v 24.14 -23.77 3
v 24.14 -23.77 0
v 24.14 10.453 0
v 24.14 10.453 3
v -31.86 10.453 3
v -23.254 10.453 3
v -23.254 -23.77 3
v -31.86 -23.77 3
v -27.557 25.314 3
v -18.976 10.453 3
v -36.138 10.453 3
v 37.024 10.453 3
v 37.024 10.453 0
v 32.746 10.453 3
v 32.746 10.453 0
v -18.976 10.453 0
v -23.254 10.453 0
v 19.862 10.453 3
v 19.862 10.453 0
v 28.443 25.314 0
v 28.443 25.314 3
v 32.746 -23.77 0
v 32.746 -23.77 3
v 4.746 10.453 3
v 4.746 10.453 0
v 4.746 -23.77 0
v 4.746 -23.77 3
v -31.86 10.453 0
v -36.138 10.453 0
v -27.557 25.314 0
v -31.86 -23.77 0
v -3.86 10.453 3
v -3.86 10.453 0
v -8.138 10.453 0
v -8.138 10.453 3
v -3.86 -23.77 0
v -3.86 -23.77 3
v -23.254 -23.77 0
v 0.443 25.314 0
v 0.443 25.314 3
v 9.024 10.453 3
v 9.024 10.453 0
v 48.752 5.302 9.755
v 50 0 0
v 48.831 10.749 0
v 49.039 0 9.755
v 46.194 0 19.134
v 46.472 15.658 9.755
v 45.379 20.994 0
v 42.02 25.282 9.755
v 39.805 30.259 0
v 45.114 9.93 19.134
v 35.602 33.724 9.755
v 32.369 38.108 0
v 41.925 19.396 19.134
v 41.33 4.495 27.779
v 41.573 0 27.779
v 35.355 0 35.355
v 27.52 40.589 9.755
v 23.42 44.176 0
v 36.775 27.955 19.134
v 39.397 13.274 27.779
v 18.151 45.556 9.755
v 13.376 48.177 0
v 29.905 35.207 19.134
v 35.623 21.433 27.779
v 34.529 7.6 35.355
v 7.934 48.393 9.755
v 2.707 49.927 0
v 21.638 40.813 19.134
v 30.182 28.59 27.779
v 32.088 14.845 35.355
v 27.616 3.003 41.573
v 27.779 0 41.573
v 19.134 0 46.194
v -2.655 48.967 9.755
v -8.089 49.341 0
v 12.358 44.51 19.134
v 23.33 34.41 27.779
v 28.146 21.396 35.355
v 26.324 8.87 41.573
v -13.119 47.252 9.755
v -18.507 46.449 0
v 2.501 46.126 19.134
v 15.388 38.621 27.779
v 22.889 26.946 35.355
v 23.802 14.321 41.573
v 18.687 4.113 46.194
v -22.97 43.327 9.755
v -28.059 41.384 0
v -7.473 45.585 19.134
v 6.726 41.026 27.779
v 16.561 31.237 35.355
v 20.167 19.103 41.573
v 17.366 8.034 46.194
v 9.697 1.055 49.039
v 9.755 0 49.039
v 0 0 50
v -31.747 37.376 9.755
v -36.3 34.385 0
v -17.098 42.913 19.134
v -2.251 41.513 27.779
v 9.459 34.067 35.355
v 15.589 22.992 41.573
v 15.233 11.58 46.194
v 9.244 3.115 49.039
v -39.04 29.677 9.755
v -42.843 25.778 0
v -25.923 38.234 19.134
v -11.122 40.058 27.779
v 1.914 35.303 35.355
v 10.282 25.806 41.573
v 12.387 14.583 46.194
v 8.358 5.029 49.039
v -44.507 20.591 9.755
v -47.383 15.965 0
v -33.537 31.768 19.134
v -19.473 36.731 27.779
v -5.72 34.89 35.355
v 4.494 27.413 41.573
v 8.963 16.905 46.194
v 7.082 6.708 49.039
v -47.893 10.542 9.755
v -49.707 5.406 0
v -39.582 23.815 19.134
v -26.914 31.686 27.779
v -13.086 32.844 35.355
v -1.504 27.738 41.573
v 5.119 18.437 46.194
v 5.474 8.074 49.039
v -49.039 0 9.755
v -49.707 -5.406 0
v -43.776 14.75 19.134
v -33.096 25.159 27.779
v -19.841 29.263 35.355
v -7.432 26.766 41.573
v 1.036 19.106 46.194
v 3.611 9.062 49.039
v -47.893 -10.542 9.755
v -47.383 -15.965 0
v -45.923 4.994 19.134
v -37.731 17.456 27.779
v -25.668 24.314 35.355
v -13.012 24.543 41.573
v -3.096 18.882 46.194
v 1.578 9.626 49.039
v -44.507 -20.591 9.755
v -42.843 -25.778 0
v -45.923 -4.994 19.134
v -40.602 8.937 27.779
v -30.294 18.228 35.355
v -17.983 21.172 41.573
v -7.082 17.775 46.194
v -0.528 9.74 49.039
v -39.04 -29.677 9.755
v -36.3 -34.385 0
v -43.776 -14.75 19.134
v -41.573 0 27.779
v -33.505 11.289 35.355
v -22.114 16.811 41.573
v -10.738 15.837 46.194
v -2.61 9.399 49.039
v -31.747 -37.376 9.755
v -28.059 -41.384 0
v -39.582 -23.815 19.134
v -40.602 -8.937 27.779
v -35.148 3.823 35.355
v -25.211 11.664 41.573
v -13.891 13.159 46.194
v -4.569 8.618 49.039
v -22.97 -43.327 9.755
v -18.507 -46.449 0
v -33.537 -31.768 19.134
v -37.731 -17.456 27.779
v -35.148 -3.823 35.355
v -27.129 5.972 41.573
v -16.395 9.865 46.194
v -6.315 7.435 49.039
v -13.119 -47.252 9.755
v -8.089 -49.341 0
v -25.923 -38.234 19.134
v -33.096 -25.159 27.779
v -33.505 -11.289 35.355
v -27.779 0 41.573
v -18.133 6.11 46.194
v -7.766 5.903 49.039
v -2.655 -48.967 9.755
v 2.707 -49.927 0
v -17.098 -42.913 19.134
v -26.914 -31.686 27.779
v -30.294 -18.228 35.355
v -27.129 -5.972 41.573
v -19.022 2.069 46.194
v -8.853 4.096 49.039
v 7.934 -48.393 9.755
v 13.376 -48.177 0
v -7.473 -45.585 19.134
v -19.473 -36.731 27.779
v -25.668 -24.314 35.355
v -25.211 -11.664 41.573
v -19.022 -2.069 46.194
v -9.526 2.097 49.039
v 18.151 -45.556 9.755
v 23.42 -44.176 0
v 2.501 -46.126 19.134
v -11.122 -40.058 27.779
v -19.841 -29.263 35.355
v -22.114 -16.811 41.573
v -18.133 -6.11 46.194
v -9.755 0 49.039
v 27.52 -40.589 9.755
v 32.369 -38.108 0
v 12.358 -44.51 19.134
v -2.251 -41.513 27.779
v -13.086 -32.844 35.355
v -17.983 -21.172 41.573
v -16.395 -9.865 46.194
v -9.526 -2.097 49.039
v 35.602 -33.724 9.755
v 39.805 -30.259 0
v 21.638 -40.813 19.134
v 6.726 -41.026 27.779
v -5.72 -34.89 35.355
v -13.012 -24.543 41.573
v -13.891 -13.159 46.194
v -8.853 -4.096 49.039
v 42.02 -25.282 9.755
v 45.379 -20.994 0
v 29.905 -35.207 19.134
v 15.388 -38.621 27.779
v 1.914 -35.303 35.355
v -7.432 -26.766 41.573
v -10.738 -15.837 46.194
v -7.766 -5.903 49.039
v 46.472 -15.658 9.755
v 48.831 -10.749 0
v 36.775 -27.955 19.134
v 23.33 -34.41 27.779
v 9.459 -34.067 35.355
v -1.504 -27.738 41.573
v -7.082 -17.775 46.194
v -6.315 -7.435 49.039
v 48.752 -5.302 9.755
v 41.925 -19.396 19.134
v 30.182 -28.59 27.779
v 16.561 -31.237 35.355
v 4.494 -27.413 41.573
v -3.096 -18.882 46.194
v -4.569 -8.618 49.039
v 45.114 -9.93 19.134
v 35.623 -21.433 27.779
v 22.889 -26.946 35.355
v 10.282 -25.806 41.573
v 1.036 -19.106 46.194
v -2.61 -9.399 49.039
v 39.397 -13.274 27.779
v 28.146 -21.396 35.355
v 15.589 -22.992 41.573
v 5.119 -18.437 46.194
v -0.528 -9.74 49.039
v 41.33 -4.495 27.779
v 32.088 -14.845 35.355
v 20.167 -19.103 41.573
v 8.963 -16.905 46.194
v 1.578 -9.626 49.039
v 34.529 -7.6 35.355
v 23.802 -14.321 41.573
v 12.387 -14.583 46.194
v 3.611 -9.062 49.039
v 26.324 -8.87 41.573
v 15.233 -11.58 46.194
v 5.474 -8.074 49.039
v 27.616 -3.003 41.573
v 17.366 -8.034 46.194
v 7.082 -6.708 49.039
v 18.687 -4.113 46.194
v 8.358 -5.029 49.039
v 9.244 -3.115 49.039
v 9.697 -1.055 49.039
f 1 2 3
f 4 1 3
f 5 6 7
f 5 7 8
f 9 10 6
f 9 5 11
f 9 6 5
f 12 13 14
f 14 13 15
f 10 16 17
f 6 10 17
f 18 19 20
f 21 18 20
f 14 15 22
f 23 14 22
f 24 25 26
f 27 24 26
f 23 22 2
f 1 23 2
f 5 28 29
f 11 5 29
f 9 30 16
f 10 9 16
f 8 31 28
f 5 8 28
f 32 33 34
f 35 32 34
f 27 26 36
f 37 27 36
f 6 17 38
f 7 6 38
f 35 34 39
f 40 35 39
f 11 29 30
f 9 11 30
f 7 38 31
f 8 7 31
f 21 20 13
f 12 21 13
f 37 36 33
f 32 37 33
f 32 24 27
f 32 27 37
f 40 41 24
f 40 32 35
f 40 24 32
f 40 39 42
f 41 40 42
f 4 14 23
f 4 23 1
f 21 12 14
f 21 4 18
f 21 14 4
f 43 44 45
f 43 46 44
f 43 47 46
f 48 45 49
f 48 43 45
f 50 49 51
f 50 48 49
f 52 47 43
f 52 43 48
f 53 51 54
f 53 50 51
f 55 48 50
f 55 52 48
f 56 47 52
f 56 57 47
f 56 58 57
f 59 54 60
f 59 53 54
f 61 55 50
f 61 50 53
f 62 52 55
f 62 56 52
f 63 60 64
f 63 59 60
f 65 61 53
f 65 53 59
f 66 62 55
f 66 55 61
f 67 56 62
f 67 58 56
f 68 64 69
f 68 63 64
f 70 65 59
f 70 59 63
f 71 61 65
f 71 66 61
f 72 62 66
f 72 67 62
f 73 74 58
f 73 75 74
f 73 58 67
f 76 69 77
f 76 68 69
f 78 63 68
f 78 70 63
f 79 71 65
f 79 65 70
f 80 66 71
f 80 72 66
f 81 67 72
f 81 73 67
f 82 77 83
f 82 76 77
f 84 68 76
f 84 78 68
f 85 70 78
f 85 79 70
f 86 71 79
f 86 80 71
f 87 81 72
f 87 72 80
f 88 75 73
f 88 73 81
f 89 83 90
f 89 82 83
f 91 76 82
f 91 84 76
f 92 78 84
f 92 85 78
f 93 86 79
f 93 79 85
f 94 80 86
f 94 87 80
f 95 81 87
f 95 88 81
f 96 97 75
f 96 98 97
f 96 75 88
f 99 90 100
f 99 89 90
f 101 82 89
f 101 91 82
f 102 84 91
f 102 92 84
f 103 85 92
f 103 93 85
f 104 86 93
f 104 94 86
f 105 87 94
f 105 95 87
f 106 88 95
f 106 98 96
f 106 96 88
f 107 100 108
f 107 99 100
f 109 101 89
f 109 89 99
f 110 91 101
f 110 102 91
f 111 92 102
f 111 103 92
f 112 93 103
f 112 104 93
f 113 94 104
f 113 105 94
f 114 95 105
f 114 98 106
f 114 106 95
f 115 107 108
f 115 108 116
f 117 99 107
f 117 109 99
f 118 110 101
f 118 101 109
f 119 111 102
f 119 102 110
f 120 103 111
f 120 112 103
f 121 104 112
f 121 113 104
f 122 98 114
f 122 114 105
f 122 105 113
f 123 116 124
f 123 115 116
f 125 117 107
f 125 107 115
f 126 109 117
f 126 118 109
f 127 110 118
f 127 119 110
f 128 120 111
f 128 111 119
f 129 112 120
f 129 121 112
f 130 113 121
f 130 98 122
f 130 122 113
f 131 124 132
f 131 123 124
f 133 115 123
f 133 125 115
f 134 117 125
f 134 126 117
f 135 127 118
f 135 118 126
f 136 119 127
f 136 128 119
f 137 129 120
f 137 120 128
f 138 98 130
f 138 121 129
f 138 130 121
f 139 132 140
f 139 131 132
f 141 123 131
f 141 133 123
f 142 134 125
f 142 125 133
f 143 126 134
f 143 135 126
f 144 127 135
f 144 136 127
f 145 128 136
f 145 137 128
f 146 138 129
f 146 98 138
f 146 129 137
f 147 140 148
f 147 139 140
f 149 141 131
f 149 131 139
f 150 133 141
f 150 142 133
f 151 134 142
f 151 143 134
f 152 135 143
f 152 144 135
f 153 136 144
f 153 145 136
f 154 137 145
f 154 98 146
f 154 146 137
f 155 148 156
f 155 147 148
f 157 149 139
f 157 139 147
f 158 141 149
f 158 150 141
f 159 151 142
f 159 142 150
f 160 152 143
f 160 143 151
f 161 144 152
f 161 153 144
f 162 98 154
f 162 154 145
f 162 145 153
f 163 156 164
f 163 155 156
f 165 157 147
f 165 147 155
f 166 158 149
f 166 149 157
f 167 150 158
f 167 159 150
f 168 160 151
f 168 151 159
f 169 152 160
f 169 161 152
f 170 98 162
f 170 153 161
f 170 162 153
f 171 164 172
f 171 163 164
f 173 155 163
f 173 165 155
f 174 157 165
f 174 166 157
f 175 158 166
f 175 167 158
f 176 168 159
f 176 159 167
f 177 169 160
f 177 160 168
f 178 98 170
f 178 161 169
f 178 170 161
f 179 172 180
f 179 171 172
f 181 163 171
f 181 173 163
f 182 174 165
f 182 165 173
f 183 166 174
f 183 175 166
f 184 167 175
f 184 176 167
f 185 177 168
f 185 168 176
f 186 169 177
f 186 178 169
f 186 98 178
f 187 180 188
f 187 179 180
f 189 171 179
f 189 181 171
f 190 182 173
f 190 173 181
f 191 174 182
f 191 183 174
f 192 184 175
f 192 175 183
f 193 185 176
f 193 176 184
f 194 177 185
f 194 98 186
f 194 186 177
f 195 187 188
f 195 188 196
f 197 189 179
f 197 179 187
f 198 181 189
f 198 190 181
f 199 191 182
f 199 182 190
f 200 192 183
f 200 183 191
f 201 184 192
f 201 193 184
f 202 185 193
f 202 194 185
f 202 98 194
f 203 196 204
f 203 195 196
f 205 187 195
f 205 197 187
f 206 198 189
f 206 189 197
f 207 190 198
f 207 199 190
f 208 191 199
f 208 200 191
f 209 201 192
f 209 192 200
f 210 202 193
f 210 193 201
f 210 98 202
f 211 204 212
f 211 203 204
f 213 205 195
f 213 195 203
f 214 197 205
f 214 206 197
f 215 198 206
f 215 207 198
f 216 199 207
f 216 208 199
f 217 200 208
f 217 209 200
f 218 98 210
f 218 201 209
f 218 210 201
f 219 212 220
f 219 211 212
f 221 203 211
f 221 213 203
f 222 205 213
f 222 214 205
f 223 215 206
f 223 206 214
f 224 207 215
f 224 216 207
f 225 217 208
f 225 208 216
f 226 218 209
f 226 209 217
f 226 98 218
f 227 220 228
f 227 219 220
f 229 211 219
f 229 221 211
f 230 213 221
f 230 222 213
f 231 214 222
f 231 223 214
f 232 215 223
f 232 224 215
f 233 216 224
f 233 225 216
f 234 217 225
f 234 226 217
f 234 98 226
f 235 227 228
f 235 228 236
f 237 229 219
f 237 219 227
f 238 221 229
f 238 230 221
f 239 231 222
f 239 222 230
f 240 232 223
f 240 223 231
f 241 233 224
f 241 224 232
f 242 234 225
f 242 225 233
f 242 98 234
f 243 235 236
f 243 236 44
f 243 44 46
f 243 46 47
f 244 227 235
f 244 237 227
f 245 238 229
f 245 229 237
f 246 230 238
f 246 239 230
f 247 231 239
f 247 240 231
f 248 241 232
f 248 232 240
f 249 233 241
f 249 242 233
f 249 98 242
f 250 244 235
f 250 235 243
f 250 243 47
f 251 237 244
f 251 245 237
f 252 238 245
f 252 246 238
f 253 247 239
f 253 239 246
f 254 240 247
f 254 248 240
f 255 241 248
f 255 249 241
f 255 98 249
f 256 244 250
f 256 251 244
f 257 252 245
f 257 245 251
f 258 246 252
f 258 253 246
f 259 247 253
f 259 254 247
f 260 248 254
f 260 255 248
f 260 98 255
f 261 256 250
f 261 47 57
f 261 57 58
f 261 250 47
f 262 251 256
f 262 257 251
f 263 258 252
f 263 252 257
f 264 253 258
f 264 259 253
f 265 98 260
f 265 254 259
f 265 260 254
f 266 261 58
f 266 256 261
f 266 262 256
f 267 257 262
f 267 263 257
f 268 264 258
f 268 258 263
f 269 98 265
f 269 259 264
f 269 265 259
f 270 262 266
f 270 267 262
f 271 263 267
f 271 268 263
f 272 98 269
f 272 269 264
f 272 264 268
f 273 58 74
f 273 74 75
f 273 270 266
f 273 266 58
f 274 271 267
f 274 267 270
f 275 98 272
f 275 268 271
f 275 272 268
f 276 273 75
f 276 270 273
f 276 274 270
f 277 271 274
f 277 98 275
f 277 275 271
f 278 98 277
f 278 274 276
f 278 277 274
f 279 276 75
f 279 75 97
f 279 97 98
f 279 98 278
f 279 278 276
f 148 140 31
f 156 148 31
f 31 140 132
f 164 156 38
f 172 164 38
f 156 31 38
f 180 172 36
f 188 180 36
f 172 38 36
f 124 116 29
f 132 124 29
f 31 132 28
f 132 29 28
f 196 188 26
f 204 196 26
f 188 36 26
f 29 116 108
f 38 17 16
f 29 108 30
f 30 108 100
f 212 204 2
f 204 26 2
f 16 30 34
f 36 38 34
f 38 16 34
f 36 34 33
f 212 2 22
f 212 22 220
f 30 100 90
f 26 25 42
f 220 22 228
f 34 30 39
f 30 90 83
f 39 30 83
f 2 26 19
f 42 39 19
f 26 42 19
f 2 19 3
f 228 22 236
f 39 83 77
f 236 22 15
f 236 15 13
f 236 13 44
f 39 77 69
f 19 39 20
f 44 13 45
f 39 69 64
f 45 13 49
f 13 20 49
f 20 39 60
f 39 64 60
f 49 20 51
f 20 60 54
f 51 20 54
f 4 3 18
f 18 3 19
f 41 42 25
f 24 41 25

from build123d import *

# Parameters (mm, degrees)
EXTRUDE002_DEPTH = 3
EXTRUDE003_DEPTH = 3
EXTRUDE001_DEPTH = 3
RECTANGLE_W      = 100
RECTANGLE_H      = 100
EXTRUDE_DEPTH    = 50


with BuildPart() as extrude002:
    # Fusion001 → Extrude002 (new body)
    with BuildSketch(Plane(origin=(-45, 30, 0), x_dir=(1, 0, 0), z_dir=(0, 0, 1))):
        Polygon((17.44346, -4.685924), (26.023636, -19.546554), (21.745595, -19.546554), (21.745595, -53.769589), (13.140465, -53.769589), (13.140465, -19.546554), (8.861994, -19.546554), align=None)
    extrude(amount=EXTRUDE002_DEPTH)


with BuildPart() as extrude003:
    # Fusion002 → Extrude003 (new body)
    with BuildSketch(Plane(origin=(11, 30, 0), x_dir=(1, 0, 0), z_dir=(0, 0, 1))):
        Polygon((17.44346, -4.685924), (26.023636, -19.546554), (21.745595, -19.546554), (21.745595, -53.769589), (13.140465, -53.769589), (13.140465, -19.546554), (8.861994, -19.546554), align=None)
    extrude(amount=EXTRUDE003_DEPTH)


with BuildPart() as extrude001:
    # Fusion → Extrude001 (new body)
    with BuildSketch(Plane(origin=(-17, 30, 0), x_dir=(1, 0, 0), z_dir=(0, 0, 1))):
        Polygon((17.44346, -4.685924), (26.023636, -19.546554), (21.745595, -19.546554), (21.745595, -53.769589), (13.140465, -53.769589), (13.140465, -19.546554), (8.861994, -19.546554), align=None)
    extrude(amount=EXTRUDE001_DEPTH)


with BuildPart() as extrude_body:
    # Rectangle → Extrude (new body)
    with BuildSketch(Plane(origin=(-50, 50, 0), x_dir=(1, 0, 0), z_dir=(0, 0, 1))):
        with Locations((50, -50)):
            Rectangle(RECTANGLE_W, RECTANGLE_H)
    extrude(amount=-EXTRUDE_DEPTH)


with BuildPart() as counter_bored_magnetization:
    # Sphere → Sphere (revolve)
    with BuildSketch(Plane.XZ):
        with BuildLine():
            ThreePointArc((0, -50), (50, 0), (0, 50))
            Line((0, 50), (0, -50))
        make_face()
    revolve(axis=Axis((0, 0, 0), (0, 0, 1)))

    # Cut: cut Extrude body
    add(extrude_body.part, mode=Mode.SUBTRACT)

    # Cut002: cut Extrude001
    add(extrude001.part, mode=Mode.SUBTRACT)

    # Cut003: cut Extrude003
    add(extrude003.part, mode=Mode.SUBTRACT)

    # Cut004: cut Extrude002
    add(extrude002.part, mode=Mode.SUBTRACT)


solid = counter_bored_magnetization.part
